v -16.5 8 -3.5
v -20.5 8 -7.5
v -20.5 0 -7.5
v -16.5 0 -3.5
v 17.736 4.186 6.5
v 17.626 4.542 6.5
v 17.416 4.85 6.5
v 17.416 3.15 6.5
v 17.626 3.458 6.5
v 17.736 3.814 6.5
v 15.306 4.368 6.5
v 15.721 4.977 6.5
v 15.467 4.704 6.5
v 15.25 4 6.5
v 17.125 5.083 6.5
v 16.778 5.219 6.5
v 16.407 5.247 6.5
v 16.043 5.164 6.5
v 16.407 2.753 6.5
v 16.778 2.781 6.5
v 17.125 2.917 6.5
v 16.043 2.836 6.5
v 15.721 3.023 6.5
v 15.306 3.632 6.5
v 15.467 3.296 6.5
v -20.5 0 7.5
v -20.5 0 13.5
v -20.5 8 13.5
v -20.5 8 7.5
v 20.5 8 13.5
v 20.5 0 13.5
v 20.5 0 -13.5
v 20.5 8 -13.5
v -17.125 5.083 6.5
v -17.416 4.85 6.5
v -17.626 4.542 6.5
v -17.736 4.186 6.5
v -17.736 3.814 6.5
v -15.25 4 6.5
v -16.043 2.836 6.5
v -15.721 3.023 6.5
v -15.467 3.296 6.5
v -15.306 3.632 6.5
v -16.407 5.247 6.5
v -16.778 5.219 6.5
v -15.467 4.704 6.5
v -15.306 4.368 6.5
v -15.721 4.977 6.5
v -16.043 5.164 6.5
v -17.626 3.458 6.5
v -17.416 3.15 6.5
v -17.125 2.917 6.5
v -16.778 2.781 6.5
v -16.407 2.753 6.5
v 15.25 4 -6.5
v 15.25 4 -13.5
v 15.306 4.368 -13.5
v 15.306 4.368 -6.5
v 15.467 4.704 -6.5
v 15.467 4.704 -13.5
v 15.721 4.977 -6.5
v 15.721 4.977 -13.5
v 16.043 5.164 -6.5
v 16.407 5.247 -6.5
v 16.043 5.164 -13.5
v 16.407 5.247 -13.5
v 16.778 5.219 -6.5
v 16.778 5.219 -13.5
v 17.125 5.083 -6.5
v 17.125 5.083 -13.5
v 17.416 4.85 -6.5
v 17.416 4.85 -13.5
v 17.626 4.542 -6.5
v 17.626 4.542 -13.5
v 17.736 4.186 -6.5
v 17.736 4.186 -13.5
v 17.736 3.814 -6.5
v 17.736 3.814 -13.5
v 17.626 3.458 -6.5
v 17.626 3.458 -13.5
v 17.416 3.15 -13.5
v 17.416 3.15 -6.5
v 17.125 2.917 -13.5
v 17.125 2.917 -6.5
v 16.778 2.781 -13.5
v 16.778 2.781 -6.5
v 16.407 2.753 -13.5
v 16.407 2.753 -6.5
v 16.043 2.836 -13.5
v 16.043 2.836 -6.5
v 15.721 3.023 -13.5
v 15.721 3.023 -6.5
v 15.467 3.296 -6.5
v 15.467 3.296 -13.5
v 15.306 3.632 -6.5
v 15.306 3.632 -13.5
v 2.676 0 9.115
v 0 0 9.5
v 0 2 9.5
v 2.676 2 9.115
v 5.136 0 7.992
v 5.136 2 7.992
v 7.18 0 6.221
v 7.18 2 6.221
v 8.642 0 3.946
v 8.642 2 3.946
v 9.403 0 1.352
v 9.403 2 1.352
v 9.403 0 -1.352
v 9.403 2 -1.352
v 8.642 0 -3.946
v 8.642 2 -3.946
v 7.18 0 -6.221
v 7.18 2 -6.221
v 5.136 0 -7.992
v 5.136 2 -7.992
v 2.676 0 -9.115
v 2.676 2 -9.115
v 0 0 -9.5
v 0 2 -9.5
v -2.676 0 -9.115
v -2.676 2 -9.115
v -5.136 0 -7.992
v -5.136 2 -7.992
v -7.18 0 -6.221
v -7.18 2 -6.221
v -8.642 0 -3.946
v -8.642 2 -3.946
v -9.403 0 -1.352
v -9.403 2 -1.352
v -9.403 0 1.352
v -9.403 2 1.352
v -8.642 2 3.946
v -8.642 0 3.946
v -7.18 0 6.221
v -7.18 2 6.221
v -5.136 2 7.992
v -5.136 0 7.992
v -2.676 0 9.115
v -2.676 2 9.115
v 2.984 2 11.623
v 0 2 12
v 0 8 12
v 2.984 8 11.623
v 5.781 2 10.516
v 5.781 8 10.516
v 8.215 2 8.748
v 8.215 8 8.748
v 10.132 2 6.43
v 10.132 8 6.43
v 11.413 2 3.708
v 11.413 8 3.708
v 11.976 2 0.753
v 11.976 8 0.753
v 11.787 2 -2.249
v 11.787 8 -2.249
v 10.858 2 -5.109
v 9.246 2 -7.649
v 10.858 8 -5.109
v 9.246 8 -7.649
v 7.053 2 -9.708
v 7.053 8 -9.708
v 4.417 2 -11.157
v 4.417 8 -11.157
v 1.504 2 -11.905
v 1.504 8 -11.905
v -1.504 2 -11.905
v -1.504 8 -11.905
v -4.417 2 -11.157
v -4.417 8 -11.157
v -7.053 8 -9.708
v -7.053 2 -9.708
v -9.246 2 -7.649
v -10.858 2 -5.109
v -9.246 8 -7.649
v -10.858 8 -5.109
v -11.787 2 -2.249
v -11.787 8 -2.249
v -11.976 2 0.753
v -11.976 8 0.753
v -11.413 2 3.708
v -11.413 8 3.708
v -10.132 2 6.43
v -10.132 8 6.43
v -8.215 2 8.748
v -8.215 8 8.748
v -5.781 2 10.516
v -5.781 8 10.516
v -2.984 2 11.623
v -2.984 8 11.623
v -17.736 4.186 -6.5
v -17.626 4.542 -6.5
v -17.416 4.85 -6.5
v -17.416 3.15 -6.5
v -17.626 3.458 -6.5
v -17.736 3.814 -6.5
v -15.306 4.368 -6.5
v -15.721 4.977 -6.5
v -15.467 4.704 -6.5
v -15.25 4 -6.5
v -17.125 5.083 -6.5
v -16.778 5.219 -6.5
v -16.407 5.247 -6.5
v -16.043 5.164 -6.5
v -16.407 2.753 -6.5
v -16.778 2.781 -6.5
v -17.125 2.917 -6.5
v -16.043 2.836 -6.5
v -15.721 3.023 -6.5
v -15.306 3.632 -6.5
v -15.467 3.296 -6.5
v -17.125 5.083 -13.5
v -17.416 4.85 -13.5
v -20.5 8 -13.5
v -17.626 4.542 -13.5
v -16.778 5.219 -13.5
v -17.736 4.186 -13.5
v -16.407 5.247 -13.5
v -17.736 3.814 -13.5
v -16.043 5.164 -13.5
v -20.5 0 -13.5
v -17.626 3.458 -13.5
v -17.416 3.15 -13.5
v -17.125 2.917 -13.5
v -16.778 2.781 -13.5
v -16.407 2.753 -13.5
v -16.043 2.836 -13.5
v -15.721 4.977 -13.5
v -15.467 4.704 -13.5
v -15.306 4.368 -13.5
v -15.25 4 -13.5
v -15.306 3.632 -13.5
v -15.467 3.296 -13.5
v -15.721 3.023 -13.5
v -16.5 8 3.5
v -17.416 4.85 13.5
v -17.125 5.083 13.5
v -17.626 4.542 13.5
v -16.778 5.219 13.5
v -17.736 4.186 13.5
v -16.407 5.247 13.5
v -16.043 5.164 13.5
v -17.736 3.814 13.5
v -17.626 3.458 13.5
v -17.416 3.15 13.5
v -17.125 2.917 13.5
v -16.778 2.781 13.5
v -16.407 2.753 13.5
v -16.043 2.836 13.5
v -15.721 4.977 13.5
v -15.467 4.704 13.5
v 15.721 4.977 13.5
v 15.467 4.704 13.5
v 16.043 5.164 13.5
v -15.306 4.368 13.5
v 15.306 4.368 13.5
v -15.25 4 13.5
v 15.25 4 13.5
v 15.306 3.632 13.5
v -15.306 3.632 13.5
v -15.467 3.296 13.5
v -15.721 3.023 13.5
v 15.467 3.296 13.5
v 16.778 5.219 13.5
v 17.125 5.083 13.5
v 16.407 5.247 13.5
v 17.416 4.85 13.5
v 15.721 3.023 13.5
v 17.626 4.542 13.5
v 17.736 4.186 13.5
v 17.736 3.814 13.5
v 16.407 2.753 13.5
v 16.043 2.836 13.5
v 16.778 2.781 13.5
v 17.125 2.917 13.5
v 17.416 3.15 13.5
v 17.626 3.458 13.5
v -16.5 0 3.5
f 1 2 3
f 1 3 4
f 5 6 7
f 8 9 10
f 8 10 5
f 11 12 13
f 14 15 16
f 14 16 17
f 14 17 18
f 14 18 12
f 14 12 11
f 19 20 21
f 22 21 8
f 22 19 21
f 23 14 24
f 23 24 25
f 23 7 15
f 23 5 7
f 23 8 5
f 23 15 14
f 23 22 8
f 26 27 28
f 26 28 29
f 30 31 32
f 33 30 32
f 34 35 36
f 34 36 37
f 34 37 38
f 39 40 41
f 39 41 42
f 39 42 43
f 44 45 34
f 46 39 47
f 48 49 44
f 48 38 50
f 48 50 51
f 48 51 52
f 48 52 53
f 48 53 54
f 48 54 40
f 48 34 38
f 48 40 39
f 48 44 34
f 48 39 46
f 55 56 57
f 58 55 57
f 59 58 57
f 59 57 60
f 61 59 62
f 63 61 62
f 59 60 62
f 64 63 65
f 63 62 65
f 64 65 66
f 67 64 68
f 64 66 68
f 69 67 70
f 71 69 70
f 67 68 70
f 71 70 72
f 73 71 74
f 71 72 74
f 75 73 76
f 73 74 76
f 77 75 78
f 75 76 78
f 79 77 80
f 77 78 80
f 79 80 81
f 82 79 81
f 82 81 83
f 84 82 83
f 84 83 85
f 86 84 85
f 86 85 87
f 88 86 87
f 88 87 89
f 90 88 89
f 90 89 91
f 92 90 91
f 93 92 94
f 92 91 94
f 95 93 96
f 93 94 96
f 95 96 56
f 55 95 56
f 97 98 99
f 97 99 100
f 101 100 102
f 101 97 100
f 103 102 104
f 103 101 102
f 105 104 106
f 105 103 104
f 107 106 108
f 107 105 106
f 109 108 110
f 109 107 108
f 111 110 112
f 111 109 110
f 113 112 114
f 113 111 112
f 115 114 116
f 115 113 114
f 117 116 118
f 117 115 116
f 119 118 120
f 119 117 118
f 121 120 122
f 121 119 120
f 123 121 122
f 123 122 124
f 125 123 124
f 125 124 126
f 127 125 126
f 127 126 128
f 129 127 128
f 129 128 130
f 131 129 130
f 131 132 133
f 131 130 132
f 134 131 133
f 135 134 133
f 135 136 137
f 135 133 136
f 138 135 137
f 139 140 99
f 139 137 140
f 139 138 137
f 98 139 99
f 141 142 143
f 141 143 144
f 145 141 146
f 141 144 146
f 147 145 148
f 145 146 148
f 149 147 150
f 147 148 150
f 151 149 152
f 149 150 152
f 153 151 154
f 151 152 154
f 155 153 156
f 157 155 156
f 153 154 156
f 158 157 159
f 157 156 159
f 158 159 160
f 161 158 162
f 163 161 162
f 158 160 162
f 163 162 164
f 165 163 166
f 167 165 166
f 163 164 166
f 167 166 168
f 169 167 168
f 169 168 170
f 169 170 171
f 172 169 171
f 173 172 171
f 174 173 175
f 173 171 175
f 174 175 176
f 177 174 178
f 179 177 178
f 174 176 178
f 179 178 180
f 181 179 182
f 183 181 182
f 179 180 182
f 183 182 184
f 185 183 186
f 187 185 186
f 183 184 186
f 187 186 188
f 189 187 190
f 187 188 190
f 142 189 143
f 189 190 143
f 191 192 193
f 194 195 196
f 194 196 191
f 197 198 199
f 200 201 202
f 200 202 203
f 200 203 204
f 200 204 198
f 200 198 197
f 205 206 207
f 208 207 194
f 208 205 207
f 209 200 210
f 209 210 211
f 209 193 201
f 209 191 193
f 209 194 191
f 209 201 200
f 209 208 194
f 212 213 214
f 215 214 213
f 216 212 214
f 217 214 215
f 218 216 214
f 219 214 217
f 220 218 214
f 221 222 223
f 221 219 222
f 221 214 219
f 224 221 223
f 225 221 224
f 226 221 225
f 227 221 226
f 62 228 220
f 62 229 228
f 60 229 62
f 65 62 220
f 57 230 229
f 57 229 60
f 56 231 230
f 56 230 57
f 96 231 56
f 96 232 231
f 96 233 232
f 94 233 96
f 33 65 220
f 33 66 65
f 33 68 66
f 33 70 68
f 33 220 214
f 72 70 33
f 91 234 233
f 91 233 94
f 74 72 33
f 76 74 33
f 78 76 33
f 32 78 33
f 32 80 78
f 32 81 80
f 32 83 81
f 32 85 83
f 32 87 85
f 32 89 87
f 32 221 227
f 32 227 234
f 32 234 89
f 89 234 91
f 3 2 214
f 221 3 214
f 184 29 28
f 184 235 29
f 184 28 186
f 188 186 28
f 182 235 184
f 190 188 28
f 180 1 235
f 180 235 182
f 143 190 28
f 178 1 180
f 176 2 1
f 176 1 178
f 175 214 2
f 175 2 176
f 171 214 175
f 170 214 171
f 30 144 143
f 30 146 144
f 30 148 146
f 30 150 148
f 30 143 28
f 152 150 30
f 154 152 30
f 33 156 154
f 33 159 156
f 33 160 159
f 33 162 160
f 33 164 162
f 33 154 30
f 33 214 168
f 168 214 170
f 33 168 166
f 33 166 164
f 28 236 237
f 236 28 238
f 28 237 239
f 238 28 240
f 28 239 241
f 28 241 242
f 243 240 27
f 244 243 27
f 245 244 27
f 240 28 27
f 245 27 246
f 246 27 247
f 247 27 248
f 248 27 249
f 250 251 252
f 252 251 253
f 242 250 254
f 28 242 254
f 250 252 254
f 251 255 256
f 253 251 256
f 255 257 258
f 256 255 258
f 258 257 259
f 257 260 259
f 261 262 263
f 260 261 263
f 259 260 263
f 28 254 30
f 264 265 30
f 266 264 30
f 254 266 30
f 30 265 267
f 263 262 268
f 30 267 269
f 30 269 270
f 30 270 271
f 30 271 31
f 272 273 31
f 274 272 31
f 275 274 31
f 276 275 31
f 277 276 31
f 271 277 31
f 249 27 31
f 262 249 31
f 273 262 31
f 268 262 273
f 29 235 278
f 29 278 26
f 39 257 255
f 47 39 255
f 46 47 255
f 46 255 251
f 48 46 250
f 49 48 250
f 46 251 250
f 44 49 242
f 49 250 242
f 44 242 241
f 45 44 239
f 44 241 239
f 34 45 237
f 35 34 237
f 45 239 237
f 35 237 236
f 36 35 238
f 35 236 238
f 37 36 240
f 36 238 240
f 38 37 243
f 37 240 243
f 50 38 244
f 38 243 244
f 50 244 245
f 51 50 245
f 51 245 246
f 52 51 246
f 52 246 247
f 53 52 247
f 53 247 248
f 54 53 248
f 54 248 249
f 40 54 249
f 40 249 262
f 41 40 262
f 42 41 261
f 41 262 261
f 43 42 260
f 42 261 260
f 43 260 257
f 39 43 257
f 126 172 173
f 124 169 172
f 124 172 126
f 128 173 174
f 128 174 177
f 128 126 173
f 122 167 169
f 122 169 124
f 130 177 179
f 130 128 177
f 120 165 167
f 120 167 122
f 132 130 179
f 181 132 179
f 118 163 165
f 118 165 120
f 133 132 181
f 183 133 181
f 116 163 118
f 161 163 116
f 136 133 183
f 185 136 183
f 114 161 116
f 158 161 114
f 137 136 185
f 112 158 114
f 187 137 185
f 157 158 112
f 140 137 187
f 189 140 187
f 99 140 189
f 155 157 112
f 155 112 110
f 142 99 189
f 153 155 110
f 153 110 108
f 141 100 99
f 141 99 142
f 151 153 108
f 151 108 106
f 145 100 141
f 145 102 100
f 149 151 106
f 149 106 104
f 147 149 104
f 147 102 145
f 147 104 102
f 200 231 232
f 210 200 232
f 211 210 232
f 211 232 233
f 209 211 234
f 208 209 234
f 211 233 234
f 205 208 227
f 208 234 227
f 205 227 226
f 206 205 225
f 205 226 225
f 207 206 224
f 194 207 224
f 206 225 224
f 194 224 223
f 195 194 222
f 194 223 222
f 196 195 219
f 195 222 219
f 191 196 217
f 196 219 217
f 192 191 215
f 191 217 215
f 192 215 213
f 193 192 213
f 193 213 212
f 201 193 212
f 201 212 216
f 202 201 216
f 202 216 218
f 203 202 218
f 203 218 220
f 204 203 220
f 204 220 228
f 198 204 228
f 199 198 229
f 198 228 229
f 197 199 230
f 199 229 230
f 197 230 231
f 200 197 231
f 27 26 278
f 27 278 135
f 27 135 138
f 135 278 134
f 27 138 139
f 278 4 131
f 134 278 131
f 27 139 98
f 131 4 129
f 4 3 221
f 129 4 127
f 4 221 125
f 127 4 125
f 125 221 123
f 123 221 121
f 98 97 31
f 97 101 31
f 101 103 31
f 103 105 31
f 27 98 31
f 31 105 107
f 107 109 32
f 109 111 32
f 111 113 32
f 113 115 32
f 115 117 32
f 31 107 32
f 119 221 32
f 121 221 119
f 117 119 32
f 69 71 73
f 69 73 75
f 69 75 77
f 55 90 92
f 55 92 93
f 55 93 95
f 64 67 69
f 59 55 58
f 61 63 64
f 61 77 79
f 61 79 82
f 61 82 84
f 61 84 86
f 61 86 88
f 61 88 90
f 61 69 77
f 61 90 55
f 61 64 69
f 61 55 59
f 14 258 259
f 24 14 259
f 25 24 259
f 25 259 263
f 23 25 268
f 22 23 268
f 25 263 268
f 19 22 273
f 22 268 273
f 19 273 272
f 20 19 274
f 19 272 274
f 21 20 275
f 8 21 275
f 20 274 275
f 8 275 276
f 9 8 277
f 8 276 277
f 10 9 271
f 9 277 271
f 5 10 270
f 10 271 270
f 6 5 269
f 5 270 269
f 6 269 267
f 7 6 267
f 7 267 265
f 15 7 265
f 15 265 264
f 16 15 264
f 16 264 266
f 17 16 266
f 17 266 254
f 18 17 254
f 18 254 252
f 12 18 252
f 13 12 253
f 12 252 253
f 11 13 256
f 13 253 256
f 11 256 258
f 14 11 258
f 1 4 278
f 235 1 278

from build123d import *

# Parameters (mm, degrees)
SKETCH_1_W          = 41
SKETCH_1_H          = 27
SKETCH_1_R          = 9.5
EXTRUDE_1_DEPTH     = 8
SKETCH_2_R          = 12
CUT_EXTRUDE_1_DEPTH = 6
CUT_EXTRUDE_2_DEPTH = 8
SKETCH_4_R          = 1.25
CUT_EXTRUDE_3_DEPTH = 7
SKETCH_5_R          = 1.25
CUT_EXTRUDE_4_DEPTH = 7


with BuildPart() as part:
    # Эскиз1 → Бобышка-Вытянуть1 (new body)
    with BuildSketch(Plane(origin=(0, 0, 0), x_dir=(1, 0, 0), z_dir=(0, 1, 0))):
        Rectangle(SKETCH_1_W, SKETCH_1_H)
        with Locations(Location((0, 0, 0), (0, 0, 270))):  # turned: the seam where the file's is
            Circle(SKETCH_1_R, mode=Mode.SUBTRACT)
    extrude(amount=EXTRUDE_1_DEPTH)

    # Эскиз2 → Вырез-Вытянуть1 (cut)
    with BuildSketch(Plane(origin=(0, 8, 0), x_dir=(1, 0, 0), z_dir=(0, 1, 0))):
        with Locations(Location((0, 0, 0), (0, 0, 270))):  # turned: the seam where the file's is
            Circle(SKETCH_2_R)
    extrude(amount=-CUT_EXTRUDE_1_DEPTH, mode=Mode.SUBTRACT)

    # Эскиз3 → Вырез-Вытянуть2 (cut)
    with BuildSketch(Plane(origin=(0, 8, 0), x_dir=(1, 0, 0), z_dir=(0, 1, 0))):
        Polygon((-20.5, 7.5), (-16.5, 3.5), (-16.5, -3.5), (-20.5, -7.5), align=None)
    extrude(amount=-CUT_EXTRUDE_2_DEPTH, mode=Mode.SUBTRACT)

    # Эскиз4 → Вырез-Вытянуть3 (cut)
    with BuildSketch(Plane.XY.offset(13.5)):
        with Locations((-16.5, 4)):
            Circle(SKETCH_4_R)
        with Locations(Location((16.5, 4, 0), (0, 0, 180))):  # turned: the seam where the file's is
            Circle(SKETCH_4_R)
    extrude(amount=-CUT_EXTRUDE_3_DEPTH, mode=Mode.SUBTRACT)

    # Эскиз5 → Вырез-Вытянуть4 (cut)
    with BuildSketch(Plane(origin=(0, 0, -13.5), x_dir=(-1, 0, 0), z_dir=(0, 0, -1))):
        with Locations((-16.5, 4)):
            Circle(SKETCH_5_R)
        with Locations(Location((16.5, 4, 0), (0, 0, 180))):  # turned: the seam where the file's is
            Circle(SKETCH_5_R)
    extrude(amount=-CUT_EXTRUDE_4_DEPTH, mode=Mode.SUBTRACT)


solid = part.part
